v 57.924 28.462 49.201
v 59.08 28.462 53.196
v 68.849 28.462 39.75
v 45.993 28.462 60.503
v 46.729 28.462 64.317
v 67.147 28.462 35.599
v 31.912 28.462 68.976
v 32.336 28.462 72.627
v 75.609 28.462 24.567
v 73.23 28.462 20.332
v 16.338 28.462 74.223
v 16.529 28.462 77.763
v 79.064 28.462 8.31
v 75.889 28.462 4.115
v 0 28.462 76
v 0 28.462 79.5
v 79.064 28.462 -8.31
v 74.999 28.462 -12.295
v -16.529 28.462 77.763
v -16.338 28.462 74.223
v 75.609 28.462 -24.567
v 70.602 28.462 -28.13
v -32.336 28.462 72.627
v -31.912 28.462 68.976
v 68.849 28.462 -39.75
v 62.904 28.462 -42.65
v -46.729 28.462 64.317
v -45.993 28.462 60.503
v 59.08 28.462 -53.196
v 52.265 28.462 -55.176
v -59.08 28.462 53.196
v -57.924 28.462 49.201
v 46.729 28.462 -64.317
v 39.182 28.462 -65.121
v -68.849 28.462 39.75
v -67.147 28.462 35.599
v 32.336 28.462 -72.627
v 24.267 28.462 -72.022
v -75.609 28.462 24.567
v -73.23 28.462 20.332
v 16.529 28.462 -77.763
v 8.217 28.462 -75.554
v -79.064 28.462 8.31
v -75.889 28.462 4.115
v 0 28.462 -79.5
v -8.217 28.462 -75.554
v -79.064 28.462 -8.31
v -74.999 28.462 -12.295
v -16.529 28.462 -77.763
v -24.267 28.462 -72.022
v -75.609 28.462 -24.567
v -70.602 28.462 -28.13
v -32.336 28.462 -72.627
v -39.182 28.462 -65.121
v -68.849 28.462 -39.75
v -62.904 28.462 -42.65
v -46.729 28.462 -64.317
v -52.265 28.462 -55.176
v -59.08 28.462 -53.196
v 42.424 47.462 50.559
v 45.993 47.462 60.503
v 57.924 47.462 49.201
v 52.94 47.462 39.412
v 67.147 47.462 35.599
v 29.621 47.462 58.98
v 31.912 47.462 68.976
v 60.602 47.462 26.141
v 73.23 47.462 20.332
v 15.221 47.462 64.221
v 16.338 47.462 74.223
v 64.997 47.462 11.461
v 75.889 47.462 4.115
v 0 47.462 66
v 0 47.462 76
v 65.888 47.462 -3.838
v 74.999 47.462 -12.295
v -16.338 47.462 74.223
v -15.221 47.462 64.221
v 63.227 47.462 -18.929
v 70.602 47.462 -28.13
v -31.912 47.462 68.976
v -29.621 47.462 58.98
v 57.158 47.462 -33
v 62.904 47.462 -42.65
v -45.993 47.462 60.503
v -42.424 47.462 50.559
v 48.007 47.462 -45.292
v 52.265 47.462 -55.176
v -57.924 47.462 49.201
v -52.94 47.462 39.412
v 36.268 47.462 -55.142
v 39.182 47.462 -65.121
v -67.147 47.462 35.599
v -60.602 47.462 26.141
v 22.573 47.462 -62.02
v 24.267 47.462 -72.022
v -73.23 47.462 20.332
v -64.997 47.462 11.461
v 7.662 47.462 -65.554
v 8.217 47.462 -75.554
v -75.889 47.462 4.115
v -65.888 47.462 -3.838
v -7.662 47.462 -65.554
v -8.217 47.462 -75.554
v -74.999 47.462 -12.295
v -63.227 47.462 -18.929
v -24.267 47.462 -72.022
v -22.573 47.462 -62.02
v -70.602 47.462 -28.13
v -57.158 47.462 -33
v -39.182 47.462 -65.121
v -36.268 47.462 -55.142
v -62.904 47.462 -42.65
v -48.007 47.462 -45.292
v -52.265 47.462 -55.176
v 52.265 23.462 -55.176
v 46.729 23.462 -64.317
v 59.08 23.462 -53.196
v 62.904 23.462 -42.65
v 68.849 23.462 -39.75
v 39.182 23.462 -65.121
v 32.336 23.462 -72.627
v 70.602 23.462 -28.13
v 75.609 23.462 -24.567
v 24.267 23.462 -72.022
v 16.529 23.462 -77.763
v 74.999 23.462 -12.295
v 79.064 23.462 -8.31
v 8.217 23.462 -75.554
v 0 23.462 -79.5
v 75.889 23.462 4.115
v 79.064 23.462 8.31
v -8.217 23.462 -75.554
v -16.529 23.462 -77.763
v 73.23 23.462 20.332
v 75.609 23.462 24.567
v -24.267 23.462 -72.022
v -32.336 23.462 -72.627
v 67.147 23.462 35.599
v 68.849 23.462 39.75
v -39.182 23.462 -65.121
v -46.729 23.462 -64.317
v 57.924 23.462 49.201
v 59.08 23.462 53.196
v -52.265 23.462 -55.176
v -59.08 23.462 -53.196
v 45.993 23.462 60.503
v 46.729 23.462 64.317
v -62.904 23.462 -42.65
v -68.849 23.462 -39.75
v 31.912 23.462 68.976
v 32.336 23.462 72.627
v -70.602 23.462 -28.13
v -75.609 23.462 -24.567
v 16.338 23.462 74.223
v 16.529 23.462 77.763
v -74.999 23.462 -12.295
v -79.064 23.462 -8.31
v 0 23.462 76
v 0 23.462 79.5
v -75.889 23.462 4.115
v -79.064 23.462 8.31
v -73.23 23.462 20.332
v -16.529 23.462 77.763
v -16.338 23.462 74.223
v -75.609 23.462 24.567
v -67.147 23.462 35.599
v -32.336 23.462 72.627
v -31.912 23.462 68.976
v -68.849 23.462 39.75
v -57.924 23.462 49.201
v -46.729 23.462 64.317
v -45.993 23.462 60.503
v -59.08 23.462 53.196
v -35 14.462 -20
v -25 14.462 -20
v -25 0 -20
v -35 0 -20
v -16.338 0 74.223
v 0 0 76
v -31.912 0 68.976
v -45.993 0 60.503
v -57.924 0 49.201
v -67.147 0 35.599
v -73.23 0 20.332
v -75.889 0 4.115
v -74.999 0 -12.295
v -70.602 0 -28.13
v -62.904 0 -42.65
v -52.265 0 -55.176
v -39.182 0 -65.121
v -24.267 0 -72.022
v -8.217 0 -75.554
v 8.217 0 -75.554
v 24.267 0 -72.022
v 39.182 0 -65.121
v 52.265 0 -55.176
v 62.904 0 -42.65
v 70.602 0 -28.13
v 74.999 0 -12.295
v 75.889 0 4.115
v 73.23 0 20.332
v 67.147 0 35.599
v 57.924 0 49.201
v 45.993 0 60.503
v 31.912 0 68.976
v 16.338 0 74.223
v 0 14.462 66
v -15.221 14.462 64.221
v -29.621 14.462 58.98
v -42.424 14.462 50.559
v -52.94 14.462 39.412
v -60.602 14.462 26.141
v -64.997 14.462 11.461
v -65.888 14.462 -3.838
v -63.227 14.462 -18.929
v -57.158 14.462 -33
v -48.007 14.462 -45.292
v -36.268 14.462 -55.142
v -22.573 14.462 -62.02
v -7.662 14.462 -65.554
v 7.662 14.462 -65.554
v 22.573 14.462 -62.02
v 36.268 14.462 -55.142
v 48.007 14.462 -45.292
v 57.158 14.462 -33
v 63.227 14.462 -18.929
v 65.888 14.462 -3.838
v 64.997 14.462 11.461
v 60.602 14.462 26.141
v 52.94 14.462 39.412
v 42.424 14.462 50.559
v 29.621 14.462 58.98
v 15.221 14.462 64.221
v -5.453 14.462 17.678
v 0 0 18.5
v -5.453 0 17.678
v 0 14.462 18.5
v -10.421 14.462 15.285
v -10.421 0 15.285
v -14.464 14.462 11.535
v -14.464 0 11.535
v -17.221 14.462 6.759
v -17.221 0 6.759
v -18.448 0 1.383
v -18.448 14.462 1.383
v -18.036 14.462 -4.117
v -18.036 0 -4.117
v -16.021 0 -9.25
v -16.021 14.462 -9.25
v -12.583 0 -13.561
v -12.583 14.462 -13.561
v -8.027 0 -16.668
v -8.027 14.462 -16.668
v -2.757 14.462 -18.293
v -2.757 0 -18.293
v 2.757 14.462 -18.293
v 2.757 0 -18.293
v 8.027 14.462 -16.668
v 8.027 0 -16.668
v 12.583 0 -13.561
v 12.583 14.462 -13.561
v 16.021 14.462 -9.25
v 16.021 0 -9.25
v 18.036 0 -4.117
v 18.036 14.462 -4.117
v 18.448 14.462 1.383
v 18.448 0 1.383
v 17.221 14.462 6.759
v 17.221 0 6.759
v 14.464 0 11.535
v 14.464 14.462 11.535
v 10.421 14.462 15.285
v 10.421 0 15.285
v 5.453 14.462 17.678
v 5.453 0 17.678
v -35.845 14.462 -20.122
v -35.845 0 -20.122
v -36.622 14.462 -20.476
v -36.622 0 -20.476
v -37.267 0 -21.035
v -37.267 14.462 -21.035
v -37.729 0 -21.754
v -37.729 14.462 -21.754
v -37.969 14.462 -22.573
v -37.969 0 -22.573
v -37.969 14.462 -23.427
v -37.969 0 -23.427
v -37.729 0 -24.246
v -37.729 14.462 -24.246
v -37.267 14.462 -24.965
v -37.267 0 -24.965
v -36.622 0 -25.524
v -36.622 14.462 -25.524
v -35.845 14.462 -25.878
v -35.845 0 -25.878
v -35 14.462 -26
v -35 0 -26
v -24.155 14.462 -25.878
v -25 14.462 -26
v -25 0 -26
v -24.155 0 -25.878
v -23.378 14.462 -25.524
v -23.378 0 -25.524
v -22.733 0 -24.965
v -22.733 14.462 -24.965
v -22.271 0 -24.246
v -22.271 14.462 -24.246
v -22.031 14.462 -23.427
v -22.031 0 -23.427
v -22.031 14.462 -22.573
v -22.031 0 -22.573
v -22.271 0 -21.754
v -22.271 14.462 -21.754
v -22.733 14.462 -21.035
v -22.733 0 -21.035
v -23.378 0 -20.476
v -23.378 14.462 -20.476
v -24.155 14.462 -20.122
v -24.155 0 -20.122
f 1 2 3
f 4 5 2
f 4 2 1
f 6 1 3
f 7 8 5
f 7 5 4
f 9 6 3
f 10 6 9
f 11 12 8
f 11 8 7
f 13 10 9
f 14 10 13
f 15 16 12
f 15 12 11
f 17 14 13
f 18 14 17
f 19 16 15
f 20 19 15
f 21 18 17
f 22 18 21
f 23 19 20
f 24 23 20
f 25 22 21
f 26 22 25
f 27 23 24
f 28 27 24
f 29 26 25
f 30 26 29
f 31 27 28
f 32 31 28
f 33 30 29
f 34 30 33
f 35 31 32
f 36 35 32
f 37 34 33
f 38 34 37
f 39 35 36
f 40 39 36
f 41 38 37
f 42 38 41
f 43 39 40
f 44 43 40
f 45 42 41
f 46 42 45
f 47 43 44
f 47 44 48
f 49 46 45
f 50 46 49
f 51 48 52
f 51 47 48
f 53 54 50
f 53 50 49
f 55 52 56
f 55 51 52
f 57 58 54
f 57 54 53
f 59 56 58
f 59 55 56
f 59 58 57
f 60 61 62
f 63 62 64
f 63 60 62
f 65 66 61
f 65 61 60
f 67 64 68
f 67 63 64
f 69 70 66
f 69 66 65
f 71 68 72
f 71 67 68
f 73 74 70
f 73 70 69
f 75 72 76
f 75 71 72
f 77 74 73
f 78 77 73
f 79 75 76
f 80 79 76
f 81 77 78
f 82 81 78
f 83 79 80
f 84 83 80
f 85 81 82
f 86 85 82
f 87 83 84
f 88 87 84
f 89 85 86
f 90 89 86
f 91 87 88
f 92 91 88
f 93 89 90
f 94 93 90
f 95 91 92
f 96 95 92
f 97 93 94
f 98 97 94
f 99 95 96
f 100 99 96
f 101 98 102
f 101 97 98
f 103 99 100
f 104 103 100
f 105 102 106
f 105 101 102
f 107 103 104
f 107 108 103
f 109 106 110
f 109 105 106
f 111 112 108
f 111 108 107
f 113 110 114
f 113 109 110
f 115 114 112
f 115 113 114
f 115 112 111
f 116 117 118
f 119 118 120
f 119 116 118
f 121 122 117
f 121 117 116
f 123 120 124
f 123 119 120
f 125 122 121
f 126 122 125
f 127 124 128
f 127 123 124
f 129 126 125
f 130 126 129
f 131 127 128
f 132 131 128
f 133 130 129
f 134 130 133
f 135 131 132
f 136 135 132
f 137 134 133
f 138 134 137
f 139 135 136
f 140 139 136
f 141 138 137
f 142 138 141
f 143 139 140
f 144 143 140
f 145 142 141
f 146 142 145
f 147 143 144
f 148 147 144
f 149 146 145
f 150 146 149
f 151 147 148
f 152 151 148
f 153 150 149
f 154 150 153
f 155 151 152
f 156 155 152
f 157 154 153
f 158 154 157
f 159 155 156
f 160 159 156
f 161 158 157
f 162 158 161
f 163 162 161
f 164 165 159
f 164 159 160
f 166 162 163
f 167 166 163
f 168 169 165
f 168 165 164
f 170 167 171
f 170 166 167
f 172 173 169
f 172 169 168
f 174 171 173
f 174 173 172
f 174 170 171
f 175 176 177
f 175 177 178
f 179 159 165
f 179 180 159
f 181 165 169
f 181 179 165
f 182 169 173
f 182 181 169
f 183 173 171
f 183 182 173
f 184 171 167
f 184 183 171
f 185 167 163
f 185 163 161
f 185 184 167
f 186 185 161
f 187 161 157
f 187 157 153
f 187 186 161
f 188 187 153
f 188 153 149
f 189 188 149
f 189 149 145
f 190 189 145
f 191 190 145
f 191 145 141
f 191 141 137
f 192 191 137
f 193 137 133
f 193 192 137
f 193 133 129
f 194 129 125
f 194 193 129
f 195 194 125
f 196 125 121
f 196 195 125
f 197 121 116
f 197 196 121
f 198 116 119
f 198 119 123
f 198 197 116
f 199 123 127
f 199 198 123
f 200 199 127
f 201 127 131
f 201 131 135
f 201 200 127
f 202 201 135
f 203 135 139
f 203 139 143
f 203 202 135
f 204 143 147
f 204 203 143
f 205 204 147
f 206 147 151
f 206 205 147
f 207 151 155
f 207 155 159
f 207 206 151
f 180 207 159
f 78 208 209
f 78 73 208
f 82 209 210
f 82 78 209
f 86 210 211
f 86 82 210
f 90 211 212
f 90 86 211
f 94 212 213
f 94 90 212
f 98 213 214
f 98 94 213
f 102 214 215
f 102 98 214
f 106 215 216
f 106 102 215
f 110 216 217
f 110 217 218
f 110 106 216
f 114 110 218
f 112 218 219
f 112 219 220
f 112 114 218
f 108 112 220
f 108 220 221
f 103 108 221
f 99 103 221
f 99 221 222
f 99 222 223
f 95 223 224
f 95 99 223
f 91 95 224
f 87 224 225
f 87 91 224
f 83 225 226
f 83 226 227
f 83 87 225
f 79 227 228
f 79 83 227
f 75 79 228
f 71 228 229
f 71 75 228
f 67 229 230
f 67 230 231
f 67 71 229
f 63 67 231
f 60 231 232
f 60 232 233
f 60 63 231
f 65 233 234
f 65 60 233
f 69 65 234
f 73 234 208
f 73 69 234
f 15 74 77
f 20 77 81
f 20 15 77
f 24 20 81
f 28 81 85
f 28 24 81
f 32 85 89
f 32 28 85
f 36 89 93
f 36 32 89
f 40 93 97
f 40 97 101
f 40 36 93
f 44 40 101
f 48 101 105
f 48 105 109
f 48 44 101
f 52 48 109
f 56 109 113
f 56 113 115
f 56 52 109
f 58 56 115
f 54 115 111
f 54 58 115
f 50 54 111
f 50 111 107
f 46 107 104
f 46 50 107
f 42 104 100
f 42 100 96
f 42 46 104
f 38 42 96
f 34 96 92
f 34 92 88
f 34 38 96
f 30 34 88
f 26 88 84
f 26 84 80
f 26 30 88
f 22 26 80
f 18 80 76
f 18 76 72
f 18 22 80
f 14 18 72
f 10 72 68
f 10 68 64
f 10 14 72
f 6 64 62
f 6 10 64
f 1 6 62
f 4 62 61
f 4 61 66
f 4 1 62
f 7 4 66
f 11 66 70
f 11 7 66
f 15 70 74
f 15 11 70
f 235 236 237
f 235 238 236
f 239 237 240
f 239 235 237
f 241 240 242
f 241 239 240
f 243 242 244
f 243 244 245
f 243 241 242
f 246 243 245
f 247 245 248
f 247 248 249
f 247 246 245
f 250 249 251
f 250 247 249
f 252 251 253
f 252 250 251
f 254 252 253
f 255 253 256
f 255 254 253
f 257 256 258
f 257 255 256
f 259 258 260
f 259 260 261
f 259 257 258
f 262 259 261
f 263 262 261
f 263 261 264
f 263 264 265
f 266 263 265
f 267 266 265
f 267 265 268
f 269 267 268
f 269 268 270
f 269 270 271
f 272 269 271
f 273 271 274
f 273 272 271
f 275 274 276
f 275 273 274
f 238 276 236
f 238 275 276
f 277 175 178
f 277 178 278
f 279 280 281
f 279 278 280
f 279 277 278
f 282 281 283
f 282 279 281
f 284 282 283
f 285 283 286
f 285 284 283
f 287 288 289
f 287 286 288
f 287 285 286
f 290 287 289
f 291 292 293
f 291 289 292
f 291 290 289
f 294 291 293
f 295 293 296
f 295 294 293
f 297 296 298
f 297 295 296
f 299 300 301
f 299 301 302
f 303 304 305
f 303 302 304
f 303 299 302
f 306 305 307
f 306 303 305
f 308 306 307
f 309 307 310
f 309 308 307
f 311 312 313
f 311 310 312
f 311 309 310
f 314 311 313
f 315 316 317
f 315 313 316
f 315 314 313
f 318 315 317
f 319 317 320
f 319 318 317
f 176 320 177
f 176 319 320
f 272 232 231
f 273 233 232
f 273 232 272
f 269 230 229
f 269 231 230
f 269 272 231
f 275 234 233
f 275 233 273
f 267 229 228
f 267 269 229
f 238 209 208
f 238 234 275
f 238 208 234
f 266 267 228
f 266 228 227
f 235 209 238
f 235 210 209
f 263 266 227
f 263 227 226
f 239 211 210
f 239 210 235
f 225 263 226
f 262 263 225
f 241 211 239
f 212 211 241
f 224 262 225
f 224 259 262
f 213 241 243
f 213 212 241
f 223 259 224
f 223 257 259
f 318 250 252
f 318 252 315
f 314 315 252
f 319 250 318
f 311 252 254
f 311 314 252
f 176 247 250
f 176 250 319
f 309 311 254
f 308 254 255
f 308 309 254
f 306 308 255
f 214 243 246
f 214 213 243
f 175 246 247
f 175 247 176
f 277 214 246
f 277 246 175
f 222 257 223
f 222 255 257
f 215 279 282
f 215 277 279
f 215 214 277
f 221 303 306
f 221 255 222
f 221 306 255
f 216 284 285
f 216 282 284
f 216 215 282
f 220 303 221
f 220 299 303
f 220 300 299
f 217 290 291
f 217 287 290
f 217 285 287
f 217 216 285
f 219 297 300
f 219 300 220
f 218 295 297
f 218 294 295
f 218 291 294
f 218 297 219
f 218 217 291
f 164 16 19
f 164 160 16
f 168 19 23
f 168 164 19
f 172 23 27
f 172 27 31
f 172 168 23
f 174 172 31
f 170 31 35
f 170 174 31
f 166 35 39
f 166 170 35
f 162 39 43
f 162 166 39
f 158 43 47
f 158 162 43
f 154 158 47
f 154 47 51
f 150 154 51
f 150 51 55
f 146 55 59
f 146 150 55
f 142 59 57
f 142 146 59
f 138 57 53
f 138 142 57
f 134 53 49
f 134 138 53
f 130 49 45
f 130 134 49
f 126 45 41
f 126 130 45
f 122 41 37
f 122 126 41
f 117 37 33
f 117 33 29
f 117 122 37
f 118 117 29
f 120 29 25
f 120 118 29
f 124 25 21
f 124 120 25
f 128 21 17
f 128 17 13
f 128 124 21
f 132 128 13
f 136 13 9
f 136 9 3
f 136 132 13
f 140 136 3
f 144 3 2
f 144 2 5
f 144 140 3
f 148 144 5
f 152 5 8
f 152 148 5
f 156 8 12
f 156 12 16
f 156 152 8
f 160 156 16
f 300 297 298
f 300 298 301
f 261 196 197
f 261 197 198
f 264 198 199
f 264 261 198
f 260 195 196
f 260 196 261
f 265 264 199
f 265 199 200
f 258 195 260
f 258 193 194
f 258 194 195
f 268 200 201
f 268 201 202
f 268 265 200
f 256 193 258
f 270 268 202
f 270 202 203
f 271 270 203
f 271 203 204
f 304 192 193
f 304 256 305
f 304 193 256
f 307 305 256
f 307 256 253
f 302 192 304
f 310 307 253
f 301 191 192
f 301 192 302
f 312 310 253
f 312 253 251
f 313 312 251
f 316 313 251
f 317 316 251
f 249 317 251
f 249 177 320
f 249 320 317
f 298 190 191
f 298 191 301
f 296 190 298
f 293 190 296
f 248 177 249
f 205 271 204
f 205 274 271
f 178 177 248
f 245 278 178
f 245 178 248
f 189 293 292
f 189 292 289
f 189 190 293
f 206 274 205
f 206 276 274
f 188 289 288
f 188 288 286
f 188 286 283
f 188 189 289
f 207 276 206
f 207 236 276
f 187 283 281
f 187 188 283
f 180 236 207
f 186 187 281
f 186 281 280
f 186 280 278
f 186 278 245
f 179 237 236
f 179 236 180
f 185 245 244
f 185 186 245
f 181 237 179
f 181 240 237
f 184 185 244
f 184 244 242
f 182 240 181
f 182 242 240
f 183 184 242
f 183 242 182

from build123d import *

# Parameters (mm, degrees)
ENL_V_MAT_EXTRU_2_REACH = 117.06


with BuildPart() as part:
    # Esquisse1 → Révolution1 (revolve)
    with BuildSketch(Plane.XY, mode=Mode.PRIVATE) as r_volution1_sk:
        Polygon((-76, 0), (-18.5, 0), (-18.5, 14.461538462), (-66, 14.461538462), (-66, 47.461538462), (-76, 47.461538462), (-76, 28.461538462), (-79.5, 28.461538462), (-79.5, 23.461538462), (-76, 23.461538462), align=None)
    revolve(r_volution1_sk.sketch.rotate(Axis((0, 101.923076923, 0), (0, -1, 0)), 270), axis=Axis((0, 101.923076923, 0), (0, -1, 0)))

    # Esquisse2 → Enlèv. mat.-Extru.2 (cut, up to next)
    with BuildSketch(Plane(origin=(0, 24.461538462, 0), x_dir=(1, 0, 0), z_dir=(0, 1, 0)), mode=Mode.PRIVATE) as enl_v_mat_extru_2_sk1:
        with BuildLine():
            Line((-35, 26), (-25, 26))
            ThreePointArc((-25, 26), (-22, 23), (-25, 20))
            Line((-25, 20), (-35, 20))
            ThreePointArc((-35, 20), (-38, 23), (-35, 26))
        make_face()
    enl_v_mat_extru_2_tool1 = extrude(enl_v_mat_extru_2_sk1.sketch, amount=-ENL_V_MAT_EXTRU_2_REACH, mode=Mode.PRIVATE) & part.part
    add(enl_v_mat_extru_2_tool1.solids().sort_by_distance((-30, 24.461538, -23))[0], mode=Mode.SUBTRACT)


solid = part.part
